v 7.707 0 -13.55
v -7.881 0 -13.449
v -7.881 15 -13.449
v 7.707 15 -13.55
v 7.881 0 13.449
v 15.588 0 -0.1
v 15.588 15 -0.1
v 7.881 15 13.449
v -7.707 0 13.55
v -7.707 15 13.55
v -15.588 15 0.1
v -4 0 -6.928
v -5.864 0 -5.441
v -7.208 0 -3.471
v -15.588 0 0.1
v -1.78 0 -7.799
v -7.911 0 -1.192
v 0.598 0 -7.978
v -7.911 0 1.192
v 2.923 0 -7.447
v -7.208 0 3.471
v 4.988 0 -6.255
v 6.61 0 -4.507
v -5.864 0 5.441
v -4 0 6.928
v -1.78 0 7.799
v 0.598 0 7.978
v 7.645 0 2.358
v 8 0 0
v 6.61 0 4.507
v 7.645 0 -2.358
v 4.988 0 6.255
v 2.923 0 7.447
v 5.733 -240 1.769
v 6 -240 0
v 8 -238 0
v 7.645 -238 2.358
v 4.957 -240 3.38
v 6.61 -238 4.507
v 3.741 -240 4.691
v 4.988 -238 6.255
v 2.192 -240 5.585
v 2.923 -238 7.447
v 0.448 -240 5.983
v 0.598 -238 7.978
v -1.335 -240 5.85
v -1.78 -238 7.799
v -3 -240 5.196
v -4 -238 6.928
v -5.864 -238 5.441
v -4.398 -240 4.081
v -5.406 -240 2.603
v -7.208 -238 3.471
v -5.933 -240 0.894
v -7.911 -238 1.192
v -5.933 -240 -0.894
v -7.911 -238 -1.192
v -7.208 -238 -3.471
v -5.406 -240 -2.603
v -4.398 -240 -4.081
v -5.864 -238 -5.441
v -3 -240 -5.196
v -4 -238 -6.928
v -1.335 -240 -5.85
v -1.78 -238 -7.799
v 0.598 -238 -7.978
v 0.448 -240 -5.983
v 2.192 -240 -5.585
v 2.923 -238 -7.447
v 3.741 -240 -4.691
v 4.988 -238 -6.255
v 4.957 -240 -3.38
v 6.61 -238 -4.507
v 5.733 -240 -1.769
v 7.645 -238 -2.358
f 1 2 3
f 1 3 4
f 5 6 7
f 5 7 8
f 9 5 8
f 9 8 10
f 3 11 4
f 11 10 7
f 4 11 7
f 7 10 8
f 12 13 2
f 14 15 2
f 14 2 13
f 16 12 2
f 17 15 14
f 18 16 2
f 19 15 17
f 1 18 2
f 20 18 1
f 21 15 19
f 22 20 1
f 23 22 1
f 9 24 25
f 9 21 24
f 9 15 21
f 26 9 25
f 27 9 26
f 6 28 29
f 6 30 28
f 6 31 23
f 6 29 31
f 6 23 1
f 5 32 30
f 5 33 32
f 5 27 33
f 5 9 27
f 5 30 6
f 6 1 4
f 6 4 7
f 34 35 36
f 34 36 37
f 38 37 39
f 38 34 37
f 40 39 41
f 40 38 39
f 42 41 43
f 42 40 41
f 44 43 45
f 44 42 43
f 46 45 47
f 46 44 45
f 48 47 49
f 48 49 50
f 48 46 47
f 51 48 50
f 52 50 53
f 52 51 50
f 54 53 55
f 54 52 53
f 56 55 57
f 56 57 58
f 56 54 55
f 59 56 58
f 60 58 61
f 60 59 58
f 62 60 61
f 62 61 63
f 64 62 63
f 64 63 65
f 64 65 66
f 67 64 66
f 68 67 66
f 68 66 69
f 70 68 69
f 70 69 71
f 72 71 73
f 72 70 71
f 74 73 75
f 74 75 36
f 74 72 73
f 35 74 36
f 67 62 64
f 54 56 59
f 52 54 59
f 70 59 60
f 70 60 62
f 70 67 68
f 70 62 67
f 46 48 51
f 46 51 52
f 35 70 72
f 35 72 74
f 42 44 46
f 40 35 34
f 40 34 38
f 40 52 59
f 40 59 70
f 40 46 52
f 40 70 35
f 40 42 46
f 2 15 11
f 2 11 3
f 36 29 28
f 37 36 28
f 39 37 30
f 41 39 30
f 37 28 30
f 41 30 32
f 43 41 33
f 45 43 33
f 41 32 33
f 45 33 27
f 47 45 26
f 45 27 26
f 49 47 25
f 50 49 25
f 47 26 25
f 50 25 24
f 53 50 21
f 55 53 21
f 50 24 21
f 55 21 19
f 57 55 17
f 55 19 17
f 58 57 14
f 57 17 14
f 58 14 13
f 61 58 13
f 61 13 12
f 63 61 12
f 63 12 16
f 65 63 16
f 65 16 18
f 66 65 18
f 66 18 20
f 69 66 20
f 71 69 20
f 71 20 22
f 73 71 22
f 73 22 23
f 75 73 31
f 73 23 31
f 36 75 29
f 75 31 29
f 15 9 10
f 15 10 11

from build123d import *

# Parameters (mm, degrees)
F1_DEPTH = 15
F2_R     = 8
F3_DEPTH = 240
F4_SIZE  = 2


with BuildPart() as f1:
    # F0 (on Front) → F1 (new body)
    with BuildSketch(Plane.XZ):
        Polygon((-15.588133, 0.100479), (-7.881084, -13.44948), (7.707049, -13.549959), (15.588133, -0.100479), (7.881084, 13.44948), (-7.707049, 13.549959), align=None)
    extrude(amount=-F1_DEPTH)

    # F2 (on face) → F3 (join)
    with BuildSketch(Plane.XZ):
        Circle(F2_R)
    extrude(amount=F3_DEPTH)

    # F4
    f4_edges = [f1.edges().sort_by_distance(p)[0] for p in [
        (-8, -240, 0),
    ]]
    chamfer(f4_edges, length=F4_SIZE)


solid = f1.part
